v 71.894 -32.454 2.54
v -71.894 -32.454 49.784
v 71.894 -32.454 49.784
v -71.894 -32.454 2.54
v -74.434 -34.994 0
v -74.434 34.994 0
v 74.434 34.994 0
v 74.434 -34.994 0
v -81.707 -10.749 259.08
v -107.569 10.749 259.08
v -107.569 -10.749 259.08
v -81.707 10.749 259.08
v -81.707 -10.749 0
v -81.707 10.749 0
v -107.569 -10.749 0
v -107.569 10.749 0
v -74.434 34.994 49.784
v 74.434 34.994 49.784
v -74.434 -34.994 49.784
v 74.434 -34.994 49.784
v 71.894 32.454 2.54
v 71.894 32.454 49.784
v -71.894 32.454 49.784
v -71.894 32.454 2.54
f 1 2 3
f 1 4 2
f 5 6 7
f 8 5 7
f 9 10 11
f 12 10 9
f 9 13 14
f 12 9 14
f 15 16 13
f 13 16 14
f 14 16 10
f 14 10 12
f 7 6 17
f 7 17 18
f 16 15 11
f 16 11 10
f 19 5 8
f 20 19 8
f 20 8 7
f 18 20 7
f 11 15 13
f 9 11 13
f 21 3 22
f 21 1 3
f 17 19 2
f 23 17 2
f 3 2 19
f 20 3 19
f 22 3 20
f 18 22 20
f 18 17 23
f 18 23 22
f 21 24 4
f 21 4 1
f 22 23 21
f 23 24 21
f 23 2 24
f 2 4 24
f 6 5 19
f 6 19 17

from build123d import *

# Parameters (mm, degrees)
F0_W     = 148.8671
F0_H     = 69.988542
F1_DEPTH = 49.784
F2_T     = -2.54
F3_W     = 25.8618
F3_H     = 21.497636
F4_DEPTH = 259.08


with BuildPart() as f1:
    # F0 (on Top) → F1 (new body)
    with BuildSketch(Plane.XY):
        Rectangle(F0_W, F0_H)
    extrude(amount=F1_DEPTH)

    # F2
    f2_openings = [f1.faces().sort_by_distance(p)[0] for p in [
        (0, 0, 49.784),
    ]]
    offset(amount=F2_T, openings=f2_openings)


with BuildPart() as f4:
    # F3 (on Top) → F4 (new body)
    with BuildSketch(Plane.XY):
        with Locations((-94.638087, 0)):
            Rectangle(F3_W, F3_H)
    extrude(amount=F4_DEPTH)


solid = Compound([f1.part, f4.part])
